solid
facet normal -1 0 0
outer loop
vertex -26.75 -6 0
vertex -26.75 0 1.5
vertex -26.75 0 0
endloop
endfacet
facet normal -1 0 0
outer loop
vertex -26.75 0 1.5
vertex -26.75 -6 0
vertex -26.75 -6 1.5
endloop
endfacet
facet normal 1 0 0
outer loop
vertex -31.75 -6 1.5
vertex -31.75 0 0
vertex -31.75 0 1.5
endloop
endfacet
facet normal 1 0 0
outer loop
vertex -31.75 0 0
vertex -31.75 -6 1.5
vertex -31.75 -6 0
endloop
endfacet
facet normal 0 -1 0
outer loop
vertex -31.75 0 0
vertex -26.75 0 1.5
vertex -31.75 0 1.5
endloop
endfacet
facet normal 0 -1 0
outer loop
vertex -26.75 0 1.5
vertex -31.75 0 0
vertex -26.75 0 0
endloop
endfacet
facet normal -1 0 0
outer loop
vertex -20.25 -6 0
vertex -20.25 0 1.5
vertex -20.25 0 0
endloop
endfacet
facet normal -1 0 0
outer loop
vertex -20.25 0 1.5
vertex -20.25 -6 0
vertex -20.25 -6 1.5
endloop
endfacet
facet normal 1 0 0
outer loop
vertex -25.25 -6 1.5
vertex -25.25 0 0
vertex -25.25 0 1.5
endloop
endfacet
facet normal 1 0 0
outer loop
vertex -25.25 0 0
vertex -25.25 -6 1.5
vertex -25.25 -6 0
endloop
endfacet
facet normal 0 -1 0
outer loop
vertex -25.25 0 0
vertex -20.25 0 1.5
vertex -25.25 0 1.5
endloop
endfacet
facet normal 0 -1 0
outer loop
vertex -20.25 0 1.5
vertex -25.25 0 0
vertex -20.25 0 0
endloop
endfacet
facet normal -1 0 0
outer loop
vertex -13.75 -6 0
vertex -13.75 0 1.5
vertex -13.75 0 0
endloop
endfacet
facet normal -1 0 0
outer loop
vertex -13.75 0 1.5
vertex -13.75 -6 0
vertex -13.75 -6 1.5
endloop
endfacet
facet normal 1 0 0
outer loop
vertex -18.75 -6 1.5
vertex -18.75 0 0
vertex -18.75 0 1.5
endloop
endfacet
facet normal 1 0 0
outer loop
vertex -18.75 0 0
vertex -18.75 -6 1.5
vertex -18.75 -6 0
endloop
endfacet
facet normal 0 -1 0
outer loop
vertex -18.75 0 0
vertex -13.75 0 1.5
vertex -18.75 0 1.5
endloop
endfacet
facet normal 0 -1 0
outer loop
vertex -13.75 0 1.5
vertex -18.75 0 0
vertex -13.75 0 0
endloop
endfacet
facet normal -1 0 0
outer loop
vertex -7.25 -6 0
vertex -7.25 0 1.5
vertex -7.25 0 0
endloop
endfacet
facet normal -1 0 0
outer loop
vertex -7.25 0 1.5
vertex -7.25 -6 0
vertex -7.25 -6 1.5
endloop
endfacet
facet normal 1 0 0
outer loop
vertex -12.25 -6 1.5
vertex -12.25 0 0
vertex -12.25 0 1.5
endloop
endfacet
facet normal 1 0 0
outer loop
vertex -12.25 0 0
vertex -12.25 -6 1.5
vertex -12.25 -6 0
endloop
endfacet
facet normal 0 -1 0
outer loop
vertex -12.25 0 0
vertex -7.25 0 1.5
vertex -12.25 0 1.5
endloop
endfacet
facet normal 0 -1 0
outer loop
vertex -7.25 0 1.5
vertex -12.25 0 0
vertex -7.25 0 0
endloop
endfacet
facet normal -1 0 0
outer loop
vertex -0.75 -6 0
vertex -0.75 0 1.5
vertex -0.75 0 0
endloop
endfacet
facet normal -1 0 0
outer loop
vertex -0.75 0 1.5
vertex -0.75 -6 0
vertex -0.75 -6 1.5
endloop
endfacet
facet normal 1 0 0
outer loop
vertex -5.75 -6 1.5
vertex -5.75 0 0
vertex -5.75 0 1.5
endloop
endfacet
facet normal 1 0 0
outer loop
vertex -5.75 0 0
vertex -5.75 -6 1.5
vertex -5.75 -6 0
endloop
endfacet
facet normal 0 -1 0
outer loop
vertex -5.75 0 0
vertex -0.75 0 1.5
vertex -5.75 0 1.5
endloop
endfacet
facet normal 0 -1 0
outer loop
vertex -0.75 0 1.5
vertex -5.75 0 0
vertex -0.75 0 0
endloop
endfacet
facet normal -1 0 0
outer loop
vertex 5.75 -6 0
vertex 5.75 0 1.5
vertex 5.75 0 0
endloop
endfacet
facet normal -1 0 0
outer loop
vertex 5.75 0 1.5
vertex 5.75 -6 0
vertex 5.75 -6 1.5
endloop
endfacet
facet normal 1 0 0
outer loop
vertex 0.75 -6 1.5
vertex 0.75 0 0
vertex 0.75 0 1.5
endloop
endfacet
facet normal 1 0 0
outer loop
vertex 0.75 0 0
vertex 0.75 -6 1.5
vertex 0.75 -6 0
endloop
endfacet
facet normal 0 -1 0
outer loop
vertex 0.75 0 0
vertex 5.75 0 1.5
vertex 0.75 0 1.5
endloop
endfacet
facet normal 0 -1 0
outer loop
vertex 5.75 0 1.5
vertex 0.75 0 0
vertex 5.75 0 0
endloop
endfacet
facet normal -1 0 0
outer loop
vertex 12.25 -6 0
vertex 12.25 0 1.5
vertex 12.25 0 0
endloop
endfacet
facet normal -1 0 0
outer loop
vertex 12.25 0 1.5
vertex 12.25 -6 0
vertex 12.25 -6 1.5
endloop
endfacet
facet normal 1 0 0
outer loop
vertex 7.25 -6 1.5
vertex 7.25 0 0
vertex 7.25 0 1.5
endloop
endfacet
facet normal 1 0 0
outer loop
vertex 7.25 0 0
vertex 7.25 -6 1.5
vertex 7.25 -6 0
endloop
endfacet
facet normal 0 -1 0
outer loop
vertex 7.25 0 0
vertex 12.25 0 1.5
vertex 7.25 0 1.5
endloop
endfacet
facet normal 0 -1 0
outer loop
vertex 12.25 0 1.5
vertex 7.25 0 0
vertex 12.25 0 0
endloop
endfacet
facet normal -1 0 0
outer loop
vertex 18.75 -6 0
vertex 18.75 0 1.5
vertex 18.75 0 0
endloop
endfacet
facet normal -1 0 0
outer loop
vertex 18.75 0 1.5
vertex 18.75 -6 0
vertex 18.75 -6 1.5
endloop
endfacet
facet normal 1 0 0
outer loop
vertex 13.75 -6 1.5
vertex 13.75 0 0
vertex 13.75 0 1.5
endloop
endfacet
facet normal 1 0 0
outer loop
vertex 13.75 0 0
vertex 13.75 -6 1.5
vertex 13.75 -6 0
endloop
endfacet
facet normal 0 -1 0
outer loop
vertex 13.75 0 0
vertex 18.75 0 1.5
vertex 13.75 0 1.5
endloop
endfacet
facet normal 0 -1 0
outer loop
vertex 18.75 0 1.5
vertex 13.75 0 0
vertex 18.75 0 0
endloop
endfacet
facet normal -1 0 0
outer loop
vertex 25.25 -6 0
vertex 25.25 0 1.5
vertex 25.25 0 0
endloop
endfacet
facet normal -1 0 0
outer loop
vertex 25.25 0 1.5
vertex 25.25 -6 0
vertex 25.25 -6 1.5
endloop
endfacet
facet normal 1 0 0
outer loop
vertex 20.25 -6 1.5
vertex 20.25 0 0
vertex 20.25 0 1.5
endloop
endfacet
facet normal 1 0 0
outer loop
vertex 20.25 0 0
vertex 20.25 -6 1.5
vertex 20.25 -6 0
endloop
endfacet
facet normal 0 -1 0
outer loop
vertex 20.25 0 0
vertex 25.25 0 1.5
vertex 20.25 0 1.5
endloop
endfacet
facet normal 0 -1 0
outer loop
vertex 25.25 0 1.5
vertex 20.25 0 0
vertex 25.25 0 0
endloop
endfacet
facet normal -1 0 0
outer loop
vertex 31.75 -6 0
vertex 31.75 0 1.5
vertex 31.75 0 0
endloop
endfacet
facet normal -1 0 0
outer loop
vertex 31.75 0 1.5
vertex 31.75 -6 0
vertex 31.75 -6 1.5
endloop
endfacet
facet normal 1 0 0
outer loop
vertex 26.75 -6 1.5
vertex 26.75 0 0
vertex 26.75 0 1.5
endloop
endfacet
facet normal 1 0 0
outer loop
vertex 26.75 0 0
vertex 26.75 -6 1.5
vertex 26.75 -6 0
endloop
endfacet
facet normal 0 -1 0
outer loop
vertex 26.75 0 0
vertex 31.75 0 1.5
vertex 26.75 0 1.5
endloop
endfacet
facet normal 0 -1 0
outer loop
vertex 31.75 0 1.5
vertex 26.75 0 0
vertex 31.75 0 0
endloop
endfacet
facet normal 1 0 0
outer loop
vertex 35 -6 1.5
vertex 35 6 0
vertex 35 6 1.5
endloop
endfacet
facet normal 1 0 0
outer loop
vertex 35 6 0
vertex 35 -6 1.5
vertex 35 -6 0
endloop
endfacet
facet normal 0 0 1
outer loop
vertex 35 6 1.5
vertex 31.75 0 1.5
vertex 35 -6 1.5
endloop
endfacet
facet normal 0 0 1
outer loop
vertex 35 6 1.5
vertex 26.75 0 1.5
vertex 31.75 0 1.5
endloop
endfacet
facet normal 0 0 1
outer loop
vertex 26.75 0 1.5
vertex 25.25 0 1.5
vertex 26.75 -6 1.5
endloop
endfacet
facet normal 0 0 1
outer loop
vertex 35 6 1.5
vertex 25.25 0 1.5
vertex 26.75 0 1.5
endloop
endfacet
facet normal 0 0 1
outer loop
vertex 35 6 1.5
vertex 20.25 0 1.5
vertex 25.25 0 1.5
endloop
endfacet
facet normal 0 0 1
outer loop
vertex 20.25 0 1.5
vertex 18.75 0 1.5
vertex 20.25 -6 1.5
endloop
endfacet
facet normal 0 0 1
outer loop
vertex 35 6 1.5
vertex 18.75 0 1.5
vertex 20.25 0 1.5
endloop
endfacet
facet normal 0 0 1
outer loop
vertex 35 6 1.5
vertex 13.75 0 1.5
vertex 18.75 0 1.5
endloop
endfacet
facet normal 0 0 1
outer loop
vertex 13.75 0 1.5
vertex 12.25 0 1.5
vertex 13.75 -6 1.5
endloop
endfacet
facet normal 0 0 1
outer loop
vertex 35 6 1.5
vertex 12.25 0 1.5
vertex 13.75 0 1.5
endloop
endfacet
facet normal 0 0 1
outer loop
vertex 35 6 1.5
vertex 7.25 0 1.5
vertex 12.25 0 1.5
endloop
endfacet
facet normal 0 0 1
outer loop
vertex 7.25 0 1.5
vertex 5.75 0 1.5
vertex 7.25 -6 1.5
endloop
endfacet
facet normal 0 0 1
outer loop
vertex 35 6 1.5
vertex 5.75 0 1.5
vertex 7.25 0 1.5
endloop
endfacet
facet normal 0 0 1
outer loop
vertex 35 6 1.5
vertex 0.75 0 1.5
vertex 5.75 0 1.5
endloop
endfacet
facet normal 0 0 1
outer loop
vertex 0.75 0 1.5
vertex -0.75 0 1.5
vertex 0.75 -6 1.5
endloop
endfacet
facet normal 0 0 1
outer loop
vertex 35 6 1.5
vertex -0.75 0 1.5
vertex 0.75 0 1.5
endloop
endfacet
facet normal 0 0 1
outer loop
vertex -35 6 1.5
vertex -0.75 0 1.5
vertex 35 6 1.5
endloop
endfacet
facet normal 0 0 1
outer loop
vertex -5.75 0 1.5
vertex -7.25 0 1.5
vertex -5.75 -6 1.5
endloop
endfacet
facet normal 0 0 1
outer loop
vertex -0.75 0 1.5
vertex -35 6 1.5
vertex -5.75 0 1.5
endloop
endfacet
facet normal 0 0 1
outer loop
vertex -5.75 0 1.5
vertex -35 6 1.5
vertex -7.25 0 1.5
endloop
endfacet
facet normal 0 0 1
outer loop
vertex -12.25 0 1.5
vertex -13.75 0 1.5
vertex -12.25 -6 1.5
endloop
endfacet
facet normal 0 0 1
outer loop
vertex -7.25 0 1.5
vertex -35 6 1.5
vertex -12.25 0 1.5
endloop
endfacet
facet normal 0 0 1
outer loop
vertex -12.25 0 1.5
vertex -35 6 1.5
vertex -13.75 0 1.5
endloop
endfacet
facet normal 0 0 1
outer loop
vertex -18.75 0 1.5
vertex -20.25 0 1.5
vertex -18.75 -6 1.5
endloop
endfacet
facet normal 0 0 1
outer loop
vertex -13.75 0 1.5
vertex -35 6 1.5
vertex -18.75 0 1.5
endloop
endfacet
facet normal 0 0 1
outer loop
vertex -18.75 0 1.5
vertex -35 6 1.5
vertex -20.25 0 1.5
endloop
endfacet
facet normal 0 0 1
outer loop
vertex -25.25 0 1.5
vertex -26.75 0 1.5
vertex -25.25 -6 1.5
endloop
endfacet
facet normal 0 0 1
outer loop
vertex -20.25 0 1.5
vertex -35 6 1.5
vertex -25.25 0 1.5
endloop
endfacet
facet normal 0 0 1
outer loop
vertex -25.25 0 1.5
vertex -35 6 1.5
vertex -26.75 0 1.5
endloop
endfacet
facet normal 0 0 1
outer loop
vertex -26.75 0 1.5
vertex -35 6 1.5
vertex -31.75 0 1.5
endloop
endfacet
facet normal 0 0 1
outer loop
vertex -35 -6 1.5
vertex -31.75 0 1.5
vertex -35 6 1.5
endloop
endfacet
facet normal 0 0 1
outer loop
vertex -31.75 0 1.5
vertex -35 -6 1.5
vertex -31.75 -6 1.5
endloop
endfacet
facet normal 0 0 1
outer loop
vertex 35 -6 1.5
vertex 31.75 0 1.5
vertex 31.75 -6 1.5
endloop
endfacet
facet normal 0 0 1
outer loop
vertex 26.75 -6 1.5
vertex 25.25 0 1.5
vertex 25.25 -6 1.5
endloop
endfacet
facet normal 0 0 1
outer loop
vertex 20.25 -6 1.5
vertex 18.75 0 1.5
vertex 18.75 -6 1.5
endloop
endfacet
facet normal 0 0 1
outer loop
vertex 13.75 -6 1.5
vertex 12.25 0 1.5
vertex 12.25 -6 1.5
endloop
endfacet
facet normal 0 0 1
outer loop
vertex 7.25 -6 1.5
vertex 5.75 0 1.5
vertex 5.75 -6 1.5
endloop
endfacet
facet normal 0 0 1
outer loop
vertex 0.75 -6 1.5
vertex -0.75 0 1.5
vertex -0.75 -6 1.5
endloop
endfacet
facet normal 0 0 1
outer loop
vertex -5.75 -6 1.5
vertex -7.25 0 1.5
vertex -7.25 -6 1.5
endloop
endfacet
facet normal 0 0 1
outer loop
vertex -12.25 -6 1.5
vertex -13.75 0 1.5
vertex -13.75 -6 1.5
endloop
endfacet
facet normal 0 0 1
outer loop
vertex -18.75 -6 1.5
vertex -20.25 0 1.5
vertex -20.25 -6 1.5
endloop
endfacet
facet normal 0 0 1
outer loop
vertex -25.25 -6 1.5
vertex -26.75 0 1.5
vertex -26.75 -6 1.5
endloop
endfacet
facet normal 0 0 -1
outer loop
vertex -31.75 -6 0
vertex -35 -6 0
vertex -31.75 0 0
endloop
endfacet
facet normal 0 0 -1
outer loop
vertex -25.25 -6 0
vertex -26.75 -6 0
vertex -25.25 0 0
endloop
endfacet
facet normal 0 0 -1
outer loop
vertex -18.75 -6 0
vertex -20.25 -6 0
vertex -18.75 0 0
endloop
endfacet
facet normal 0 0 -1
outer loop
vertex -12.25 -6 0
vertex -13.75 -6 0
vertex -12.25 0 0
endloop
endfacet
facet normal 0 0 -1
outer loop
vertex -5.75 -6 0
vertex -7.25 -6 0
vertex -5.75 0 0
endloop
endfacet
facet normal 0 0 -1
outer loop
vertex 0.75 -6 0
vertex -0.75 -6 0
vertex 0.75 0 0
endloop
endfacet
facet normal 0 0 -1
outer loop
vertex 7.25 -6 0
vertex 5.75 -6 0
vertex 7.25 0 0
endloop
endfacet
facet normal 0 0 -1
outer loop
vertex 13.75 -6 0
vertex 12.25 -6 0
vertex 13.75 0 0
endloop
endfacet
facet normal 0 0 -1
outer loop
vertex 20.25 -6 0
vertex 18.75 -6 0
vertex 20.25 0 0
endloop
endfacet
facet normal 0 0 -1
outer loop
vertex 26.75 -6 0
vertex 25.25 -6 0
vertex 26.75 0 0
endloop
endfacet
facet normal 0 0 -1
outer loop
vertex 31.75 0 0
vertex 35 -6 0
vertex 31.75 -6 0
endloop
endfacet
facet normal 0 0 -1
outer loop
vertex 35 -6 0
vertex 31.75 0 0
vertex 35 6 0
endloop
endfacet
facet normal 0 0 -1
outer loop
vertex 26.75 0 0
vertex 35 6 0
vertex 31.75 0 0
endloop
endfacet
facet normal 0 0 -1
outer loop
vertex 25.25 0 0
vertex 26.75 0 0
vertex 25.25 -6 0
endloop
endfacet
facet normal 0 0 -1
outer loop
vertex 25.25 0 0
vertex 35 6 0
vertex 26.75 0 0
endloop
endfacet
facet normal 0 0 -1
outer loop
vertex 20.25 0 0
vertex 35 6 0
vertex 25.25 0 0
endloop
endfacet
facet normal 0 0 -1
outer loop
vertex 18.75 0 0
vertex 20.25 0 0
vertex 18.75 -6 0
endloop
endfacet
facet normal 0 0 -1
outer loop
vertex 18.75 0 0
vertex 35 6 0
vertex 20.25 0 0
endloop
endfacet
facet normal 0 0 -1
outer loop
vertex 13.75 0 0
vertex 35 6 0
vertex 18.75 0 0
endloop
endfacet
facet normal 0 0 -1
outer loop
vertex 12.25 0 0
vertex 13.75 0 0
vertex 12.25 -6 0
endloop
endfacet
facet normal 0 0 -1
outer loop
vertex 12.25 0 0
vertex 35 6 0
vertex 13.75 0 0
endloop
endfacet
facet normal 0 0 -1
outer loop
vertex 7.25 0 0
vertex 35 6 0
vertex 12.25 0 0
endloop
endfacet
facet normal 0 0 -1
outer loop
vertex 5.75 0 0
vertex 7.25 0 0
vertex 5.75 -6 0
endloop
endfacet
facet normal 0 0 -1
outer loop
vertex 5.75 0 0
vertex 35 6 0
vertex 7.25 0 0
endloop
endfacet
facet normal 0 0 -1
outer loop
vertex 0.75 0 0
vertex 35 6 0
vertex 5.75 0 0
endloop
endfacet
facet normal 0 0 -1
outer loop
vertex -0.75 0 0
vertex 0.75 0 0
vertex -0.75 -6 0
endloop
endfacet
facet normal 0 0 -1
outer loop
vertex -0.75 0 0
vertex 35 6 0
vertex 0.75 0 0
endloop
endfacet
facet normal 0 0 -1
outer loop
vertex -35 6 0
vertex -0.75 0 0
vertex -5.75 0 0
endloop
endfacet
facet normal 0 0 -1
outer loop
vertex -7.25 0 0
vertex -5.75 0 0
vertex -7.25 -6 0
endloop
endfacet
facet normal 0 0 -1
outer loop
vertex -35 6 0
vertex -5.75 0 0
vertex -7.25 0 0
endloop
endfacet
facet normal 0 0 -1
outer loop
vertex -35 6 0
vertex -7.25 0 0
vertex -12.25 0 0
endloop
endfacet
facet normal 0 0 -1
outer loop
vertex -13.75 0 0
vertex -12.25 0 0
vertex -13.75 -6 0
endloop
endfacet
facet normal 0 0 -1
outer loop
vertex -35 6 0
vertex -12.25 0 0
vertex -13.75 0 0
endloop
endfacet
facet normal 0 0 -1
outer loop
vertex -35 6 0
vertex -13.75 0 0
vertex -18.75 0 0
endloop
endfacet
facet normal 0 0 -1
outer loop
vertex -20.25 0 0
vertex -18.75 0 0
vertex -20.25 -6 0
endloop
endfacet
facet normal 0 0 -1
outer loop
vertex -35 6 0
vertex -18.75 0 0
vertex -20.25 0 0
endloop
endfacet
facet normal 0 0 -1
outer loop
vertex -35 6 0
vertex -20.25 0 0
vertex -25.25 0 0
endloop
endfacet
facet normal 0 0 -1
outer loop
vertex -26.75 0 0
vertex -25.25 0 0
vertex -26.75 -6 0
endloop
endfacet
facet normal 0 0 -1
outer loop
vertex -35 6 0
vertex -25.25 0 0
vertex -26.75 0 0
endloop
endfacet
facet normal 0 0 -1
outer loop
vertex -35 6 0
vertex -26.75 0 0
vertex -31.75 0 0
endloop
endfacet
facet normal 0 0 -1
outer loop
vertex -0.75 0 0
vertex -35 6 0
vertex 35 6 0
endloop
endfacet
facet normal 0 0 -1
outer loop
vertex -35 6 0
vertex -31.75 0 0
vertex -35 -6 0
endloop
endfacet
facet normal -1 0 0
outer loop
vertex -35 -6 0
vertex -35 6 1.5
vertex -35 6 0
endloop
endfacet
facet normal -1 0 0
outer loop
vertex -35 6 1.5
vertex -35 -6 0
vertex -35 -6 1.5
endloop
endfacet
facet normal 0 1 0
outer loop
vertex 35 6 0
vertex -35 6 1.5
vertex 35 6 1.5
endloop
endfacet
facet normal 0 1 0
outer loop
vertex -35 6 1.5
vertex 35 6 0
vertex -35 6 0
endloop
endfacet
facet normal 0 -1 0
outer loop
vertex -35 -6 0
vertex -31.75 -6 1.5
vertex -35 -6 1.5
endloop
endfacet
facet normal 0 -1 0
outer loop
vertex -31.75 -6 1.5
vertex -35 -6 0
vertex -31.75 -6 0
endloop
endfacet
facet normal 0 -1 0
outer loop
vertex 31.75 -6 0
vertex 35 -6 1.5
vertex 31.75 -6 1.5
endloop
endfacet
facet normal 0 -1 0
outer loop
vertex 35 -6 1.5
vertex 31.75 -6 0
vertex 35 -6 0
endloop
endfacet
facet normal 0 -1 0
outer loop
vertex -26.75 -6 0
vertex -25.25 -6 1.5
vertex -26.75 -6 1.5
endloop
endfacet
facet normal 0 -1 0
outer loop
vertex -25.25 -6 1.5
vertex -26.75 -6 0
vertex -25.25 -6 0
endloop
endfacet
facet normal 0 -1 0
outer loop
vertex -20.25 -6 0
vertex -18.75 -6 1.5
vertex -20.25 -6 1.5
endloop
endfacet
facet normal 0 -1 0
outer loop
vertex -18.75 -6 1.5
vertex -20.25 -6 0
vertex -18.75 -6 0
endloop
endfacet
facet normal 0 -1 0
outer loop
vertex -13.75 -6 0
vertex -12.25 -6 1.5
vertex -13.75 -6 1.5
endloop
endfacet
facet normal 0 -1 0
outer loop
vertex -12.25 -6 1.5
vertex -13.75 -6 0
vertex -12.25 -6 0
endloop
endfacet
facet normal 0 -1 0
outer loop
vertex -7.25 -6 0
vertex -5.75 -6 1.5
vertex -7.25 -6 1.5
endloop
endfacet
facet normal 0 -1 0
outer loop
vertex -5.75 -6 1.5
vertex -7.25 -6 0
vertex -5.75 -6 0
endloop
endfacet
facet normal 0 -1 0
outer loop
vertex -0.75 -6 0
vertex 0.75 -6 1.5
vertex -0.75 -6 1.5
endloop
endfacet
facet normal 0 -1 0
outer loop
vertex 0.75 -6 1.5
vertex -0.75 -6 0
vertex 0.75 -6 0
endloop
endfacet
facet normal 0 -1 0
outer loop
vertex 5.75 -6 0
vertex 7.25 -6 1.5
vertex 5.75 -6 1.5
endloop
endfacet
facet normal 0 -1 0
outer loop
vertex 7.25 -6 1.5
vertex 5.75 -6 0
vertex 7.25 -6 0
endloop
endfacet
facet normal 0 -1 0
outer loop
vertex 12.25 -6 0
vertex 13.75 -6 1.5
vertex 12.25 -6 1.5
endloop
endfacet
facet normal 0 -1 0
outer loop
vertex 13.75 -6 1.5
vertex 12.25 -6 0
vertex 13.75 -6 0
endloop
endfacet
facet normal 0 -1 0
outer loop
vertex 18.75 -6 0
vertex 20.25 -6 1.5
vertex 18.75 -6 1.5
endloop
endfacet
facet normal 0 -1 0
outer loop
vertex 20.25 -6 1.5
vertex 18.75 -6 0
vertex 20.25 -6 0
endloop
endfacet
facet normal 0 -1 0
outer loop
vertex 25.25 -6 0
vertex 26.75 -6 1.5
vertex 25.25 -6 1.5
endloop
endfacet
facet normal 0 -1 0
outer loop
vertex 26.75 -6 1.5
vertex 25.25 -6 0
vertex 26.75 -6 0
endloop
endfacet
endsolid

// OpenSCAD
// 10-well comb for casting agarose gels
// Print orientation: flat on bed, spine (back bar) along +X, teeth in -Y

// ---------- Parameters ----------
spine_len    = 70;    // spine length along X (mm)
spine_w      = 12;    // spine width along Y (mm)
plate_t      = 1.5;   // comb plate thickness along Z (mm)

tooth_count  = 10;    // number of teeth
tooth_w      = 5.0;   // tooth width along X (mm)
tooth_l      = 12;    // tooth length along Y (mm)
tooth_gap    = 1.5;   // gap between neighbouring teeth (mm)

eps          = 0.5;   // cutter overshoot past faces (mm)

$fn = 64;

// ---------- Derived ----------
pitch   = tooth_w + tooth_gap;              // centre-to-centre spacing
x_start = -(tooth_count - 1) * pitch / 2;   // first tooth centre (row centred on spine)
tooth_h = tooth_l + eps;                    // cutter height from top face

// ---------- Model ----------
difference() {
    // Base plate
    translate([-spine_len / 2, -spine_w / 2, 0])
        cube([spine_len, spine_w, plate_t]);

    // Teeth cutters (through the full thickness)
    for (i = [0 : tooth_count - 1])
        translate([x_start + i * pitch - tooth_w / 2,
                   -spine_w / 2 - tooth_l / 2,
                   -eps])
            cube([tooth_w, tooth_l, tooth_h]);
}
